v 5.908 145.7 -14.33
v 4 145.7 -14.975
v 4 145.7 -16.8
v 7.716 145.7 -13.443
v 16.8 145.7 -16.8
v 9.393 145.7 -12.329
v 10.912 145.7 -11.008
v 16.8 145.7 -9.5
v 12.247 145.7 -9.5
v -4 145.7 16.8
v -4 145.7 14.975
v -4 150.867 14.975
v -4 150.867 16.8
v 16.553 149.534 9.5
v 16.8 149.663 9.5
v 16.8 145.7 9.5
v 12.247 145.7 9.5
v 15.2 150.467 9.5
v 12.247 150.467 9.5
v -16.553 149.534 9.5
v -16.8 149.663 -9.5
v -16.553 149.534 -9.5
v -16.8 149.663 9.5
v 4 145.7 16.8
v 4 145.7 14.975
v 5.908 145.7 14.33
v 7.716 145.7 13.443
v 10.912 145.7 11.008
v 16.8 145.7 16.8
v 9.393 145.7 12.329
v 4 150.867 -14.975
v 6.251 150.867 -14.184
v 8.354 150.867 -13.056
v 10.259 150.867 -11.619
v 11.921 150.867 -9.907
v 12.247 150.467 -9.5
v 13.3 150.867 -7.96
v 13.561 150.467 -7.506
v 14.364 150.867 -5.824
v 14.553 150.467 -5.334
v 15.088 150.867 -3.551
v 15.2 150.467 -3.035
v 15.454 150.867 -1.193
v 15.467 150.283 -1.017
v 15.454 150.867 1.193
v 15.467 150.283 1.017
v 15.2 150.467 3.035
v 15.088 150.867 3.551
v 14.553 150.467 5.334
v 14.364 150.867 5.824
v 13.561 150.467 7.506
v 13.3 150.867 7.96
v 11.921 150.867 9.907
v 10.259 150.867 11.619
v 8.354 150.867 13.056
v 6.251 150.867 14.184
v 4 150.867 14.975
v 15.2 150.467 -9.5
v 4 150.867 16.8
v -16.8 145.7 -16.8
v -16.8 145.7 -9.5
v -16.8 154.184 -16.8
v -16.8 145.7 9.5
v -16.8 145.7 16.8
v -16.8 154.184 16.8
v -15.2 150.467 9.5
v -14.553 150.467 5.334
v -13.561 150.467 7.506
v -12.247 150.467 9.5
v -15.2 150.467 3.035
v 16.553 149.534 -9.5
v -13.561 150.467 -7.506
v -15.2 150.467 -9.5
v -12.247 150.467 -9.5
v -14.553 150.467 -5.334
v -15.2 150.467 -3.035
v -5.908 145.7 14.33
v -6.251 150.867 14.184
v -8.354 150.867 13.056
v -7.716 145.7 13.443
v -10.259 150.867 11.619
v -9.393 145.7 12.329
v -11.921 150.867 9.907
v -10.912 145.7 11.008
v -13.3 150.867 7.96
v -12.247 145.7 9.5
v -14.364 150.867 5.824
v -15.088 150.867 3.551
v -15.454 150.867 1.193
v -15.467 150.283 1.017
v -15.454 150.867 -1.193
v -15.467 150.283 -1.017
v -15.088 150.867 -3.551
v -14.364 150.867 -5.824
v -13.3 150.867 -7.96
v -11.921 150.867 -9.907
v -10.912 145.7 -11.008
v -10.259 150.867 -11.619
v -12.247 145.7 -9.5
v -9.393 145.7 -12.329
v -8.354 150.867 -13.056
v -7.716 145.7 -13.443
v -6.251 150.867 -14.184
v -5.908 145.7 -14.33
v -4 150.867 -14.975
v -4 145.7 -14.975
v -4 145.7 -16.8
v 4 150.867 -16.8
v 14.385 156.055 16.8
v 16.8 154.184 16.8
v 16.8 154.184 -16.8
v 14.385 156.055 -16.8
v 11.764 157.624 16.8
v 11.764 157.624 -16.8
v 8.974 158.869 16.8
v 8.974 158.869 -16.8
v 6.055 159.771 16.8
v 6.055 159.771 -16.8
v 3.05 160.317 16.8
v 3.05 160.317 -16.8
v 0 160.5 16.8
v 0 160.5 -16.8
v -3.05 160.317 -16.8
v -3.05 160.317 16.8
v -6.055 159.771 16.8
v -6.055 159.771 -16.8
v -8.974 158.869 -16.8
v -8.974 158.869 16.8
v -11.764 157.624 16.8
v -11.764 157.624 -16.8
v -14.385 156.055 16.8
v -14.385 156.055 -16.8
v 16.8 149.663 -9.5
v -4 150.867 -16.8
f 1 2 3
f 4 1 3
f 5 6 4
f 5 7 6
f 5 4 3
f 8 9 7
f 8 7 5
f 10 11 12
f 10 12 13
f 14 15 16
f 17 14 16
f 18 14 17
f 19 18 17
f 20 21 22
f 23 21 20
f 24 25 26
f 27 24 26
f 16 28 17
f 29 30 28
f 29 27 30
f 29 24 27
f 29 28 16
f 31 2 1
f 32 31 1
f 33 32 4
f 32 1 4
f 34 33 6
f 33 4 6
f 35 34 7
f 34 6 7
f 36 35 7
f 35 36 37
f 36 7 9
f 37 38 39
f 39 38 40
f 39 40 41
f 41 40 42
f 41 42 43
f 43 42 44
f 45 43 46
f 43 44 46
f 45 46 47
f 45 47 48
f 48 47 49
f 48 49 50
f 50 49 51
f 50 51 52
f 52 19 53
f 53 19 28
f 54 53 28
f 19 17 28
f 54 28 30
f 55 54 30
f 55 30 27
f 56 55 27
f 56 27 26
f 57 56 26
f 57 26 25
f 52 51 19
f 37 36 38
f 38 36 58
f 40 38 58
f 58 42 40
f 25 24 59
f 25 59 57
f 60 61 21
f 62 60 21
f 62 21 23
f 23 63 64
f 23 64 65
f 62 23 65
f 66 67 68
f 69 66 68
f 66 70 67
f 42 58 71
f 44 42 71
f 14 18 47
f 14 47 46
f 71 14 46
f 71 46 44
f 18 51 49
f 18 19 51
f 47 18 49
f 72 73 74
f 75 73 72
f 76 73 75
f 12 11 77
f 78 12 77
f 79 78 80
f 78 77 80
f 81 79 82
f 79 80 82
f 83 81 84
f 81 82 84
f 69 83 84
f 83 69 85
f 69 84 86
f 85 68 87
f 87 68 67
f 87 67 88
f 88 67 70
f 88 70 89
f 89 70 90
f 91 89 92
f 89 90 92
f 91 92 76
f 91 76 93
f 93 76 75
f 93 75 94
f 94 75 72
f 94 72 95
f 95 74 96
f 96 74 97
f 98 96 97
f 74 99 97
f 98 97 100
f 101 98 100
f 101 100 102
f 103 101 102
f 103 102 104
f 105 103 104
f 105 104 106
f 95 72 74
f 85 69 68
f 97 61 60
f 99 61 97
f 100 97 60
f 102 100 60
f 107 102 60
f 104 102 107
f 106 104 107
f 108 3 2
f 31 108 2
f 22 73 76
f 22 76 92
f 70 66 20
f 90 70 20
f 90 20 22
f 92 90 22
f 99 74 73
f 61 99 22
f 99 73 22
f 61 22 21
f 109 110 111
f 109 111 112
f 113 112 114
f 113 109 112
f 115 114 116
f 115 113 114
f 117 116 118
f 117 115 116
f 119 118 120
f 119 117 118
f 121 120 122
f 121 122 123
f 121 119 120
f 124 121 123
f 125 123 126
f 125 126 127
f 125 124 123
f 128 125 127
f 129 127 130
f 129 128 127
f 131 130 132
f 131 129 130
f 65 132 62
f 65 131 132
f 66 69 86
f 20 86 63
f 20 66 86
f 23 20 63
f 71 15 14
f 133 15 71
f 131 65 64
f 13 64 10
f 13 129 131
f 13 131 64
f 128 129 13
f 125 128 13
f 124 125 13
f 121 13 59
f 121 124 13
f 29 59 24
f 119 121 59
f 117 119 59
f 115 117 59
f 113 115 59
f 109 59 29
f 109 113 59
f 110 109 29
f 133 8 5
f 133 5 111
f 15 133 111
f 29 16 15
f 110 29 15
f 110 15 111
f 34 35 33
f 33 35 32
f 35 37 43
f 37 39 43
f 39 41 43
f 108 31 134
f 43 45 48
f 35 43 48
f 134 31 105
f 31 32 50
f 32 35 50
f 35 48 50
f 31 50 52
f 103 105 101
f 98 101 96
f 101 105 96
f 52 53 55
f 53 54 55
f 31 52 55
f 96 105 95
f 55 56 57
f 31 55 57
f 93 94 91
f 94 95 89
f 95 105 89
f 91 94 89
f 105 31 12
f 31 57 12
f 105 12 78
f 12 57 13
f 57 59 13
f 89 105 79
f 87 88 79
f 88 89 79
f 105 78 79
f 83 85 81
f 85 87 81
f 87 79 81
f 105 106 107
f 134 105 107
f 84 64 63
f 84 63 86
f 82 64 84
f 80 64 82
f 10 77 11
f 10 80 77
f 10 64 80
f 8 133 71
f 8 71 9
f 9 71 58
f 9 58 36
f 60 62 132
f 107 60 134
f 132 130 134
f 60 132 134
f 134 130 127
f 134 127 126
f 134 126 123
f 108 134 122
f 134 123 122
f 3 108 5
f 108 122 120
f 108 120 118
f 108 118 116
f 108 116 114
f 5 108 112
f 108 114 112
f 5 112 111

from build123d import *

# Parameters (mm, degrees)
PAD017_DEPTH         = 16.8
PAD017_DEPTH_BACK    = 16.8
POCKET017_DEPTH      = 9.5
POCKET017_DEPTH_BACK = 9.5
CHAMFER009_SIZE      = 0.3
POCKET018_DEPTH      = 15.866909


with BuildPart() as part:
    # Sketch033 → Pad017 (new body, two sides)
    with BuildSketch(Plane.XY) as pad017_sk:
        with BuildLine():
            Line((-16.8, 10.7), (16.8, 10.7))
            Line((16.8, 10.7), (16.8, 19.183587))
            ThreePointArc((16.8, 19.183587), (0, 25.5), (-16.8, 19.183587))
            Line((-16.8, 10.7), (-16.8, 19.183587))
        make_face()
    extrude(amount=PAD017_DEPTH)
    extrude(pad017_sk.sketch, amount=-PAD017_DEPTH_BACK)

    # Sketch034 → Pocket017 (cut, two sides)
    with BuildSketch(Plane.XY) as pocket017_sk:
        with BuildLine():
            Line((-15.2, 15.466909), (15.2, 15.466909))
            Line((15.2, 15.466909), (21, 11.466909))
            Line((21, 11.466909), (23, 11.466909))
            ThreePointArc((24.265231, 8.466909), (23.680172, 9.986965), (23, 11.466909))
            Line((11, 10.5), (24.265231, 8.466909))
            Line((11, 10.5), (-11, 10.5))
            Line((-11, 10.5), (-24.265231, 8.466909))
            ThreePointArc((-23, 11.466909), (-23.680172, 9.986965), (-24.265231, 8.466909))
            Line((-21, 11.466909), (-23, 11.466909))
            Line((-15.2, 15.466909), (-21, 11.466909))
        make_face()
    extrude(amount=-POCKET017_DEPTH, mode=Mode.SUBTRACT)
    extrude(pocket017_sk.sketch, amount=POCKET017_DEPTH_BACK, mode=Mode.SUBTRACT)

    # Chamfer009
    chamfer009_edges = [part.edges().sort_by_distance(p)[0] for p in [
        (-16.8, 14.363461, 0),
        (16.8, 14.363461, 0),
    ]]
    chamfer(chamfer009_edges, length=CHAMFER009_SIZE)

    # Sketch035 → Pocket018 (cut)
    with BuildSketch(Plane.XZ):
        with BuildLine():
            Line((-4, 14.974979), (-4, 27.304979))
            Line((-4, 27.304979), (4, 27.304979))
            Line((4, 27.304979), (4, 14.974979))
            ThreePointArc((4, -14.974979), (15.5, 0), (4, 14.974979))
            Line((4, -27.304979), (4, -14.974979))
            Line((-4, -27.304979), (4, -27.304979))
            Line((-4, -14.974979), (-4, -27.304979))
            ThreePointArc((-4, 14.974979), (-15.5, 0), (-4, -14.974979))
        make_face()
    extrude(amount=-POCKET018_DEPTH, mode=Mode.SUBTRACT)


with BuildPart() as part_1:
    # Body015 placement: moved
    add(part.part.moved(Location((0, 135, 0))))


solid = part_1.part
